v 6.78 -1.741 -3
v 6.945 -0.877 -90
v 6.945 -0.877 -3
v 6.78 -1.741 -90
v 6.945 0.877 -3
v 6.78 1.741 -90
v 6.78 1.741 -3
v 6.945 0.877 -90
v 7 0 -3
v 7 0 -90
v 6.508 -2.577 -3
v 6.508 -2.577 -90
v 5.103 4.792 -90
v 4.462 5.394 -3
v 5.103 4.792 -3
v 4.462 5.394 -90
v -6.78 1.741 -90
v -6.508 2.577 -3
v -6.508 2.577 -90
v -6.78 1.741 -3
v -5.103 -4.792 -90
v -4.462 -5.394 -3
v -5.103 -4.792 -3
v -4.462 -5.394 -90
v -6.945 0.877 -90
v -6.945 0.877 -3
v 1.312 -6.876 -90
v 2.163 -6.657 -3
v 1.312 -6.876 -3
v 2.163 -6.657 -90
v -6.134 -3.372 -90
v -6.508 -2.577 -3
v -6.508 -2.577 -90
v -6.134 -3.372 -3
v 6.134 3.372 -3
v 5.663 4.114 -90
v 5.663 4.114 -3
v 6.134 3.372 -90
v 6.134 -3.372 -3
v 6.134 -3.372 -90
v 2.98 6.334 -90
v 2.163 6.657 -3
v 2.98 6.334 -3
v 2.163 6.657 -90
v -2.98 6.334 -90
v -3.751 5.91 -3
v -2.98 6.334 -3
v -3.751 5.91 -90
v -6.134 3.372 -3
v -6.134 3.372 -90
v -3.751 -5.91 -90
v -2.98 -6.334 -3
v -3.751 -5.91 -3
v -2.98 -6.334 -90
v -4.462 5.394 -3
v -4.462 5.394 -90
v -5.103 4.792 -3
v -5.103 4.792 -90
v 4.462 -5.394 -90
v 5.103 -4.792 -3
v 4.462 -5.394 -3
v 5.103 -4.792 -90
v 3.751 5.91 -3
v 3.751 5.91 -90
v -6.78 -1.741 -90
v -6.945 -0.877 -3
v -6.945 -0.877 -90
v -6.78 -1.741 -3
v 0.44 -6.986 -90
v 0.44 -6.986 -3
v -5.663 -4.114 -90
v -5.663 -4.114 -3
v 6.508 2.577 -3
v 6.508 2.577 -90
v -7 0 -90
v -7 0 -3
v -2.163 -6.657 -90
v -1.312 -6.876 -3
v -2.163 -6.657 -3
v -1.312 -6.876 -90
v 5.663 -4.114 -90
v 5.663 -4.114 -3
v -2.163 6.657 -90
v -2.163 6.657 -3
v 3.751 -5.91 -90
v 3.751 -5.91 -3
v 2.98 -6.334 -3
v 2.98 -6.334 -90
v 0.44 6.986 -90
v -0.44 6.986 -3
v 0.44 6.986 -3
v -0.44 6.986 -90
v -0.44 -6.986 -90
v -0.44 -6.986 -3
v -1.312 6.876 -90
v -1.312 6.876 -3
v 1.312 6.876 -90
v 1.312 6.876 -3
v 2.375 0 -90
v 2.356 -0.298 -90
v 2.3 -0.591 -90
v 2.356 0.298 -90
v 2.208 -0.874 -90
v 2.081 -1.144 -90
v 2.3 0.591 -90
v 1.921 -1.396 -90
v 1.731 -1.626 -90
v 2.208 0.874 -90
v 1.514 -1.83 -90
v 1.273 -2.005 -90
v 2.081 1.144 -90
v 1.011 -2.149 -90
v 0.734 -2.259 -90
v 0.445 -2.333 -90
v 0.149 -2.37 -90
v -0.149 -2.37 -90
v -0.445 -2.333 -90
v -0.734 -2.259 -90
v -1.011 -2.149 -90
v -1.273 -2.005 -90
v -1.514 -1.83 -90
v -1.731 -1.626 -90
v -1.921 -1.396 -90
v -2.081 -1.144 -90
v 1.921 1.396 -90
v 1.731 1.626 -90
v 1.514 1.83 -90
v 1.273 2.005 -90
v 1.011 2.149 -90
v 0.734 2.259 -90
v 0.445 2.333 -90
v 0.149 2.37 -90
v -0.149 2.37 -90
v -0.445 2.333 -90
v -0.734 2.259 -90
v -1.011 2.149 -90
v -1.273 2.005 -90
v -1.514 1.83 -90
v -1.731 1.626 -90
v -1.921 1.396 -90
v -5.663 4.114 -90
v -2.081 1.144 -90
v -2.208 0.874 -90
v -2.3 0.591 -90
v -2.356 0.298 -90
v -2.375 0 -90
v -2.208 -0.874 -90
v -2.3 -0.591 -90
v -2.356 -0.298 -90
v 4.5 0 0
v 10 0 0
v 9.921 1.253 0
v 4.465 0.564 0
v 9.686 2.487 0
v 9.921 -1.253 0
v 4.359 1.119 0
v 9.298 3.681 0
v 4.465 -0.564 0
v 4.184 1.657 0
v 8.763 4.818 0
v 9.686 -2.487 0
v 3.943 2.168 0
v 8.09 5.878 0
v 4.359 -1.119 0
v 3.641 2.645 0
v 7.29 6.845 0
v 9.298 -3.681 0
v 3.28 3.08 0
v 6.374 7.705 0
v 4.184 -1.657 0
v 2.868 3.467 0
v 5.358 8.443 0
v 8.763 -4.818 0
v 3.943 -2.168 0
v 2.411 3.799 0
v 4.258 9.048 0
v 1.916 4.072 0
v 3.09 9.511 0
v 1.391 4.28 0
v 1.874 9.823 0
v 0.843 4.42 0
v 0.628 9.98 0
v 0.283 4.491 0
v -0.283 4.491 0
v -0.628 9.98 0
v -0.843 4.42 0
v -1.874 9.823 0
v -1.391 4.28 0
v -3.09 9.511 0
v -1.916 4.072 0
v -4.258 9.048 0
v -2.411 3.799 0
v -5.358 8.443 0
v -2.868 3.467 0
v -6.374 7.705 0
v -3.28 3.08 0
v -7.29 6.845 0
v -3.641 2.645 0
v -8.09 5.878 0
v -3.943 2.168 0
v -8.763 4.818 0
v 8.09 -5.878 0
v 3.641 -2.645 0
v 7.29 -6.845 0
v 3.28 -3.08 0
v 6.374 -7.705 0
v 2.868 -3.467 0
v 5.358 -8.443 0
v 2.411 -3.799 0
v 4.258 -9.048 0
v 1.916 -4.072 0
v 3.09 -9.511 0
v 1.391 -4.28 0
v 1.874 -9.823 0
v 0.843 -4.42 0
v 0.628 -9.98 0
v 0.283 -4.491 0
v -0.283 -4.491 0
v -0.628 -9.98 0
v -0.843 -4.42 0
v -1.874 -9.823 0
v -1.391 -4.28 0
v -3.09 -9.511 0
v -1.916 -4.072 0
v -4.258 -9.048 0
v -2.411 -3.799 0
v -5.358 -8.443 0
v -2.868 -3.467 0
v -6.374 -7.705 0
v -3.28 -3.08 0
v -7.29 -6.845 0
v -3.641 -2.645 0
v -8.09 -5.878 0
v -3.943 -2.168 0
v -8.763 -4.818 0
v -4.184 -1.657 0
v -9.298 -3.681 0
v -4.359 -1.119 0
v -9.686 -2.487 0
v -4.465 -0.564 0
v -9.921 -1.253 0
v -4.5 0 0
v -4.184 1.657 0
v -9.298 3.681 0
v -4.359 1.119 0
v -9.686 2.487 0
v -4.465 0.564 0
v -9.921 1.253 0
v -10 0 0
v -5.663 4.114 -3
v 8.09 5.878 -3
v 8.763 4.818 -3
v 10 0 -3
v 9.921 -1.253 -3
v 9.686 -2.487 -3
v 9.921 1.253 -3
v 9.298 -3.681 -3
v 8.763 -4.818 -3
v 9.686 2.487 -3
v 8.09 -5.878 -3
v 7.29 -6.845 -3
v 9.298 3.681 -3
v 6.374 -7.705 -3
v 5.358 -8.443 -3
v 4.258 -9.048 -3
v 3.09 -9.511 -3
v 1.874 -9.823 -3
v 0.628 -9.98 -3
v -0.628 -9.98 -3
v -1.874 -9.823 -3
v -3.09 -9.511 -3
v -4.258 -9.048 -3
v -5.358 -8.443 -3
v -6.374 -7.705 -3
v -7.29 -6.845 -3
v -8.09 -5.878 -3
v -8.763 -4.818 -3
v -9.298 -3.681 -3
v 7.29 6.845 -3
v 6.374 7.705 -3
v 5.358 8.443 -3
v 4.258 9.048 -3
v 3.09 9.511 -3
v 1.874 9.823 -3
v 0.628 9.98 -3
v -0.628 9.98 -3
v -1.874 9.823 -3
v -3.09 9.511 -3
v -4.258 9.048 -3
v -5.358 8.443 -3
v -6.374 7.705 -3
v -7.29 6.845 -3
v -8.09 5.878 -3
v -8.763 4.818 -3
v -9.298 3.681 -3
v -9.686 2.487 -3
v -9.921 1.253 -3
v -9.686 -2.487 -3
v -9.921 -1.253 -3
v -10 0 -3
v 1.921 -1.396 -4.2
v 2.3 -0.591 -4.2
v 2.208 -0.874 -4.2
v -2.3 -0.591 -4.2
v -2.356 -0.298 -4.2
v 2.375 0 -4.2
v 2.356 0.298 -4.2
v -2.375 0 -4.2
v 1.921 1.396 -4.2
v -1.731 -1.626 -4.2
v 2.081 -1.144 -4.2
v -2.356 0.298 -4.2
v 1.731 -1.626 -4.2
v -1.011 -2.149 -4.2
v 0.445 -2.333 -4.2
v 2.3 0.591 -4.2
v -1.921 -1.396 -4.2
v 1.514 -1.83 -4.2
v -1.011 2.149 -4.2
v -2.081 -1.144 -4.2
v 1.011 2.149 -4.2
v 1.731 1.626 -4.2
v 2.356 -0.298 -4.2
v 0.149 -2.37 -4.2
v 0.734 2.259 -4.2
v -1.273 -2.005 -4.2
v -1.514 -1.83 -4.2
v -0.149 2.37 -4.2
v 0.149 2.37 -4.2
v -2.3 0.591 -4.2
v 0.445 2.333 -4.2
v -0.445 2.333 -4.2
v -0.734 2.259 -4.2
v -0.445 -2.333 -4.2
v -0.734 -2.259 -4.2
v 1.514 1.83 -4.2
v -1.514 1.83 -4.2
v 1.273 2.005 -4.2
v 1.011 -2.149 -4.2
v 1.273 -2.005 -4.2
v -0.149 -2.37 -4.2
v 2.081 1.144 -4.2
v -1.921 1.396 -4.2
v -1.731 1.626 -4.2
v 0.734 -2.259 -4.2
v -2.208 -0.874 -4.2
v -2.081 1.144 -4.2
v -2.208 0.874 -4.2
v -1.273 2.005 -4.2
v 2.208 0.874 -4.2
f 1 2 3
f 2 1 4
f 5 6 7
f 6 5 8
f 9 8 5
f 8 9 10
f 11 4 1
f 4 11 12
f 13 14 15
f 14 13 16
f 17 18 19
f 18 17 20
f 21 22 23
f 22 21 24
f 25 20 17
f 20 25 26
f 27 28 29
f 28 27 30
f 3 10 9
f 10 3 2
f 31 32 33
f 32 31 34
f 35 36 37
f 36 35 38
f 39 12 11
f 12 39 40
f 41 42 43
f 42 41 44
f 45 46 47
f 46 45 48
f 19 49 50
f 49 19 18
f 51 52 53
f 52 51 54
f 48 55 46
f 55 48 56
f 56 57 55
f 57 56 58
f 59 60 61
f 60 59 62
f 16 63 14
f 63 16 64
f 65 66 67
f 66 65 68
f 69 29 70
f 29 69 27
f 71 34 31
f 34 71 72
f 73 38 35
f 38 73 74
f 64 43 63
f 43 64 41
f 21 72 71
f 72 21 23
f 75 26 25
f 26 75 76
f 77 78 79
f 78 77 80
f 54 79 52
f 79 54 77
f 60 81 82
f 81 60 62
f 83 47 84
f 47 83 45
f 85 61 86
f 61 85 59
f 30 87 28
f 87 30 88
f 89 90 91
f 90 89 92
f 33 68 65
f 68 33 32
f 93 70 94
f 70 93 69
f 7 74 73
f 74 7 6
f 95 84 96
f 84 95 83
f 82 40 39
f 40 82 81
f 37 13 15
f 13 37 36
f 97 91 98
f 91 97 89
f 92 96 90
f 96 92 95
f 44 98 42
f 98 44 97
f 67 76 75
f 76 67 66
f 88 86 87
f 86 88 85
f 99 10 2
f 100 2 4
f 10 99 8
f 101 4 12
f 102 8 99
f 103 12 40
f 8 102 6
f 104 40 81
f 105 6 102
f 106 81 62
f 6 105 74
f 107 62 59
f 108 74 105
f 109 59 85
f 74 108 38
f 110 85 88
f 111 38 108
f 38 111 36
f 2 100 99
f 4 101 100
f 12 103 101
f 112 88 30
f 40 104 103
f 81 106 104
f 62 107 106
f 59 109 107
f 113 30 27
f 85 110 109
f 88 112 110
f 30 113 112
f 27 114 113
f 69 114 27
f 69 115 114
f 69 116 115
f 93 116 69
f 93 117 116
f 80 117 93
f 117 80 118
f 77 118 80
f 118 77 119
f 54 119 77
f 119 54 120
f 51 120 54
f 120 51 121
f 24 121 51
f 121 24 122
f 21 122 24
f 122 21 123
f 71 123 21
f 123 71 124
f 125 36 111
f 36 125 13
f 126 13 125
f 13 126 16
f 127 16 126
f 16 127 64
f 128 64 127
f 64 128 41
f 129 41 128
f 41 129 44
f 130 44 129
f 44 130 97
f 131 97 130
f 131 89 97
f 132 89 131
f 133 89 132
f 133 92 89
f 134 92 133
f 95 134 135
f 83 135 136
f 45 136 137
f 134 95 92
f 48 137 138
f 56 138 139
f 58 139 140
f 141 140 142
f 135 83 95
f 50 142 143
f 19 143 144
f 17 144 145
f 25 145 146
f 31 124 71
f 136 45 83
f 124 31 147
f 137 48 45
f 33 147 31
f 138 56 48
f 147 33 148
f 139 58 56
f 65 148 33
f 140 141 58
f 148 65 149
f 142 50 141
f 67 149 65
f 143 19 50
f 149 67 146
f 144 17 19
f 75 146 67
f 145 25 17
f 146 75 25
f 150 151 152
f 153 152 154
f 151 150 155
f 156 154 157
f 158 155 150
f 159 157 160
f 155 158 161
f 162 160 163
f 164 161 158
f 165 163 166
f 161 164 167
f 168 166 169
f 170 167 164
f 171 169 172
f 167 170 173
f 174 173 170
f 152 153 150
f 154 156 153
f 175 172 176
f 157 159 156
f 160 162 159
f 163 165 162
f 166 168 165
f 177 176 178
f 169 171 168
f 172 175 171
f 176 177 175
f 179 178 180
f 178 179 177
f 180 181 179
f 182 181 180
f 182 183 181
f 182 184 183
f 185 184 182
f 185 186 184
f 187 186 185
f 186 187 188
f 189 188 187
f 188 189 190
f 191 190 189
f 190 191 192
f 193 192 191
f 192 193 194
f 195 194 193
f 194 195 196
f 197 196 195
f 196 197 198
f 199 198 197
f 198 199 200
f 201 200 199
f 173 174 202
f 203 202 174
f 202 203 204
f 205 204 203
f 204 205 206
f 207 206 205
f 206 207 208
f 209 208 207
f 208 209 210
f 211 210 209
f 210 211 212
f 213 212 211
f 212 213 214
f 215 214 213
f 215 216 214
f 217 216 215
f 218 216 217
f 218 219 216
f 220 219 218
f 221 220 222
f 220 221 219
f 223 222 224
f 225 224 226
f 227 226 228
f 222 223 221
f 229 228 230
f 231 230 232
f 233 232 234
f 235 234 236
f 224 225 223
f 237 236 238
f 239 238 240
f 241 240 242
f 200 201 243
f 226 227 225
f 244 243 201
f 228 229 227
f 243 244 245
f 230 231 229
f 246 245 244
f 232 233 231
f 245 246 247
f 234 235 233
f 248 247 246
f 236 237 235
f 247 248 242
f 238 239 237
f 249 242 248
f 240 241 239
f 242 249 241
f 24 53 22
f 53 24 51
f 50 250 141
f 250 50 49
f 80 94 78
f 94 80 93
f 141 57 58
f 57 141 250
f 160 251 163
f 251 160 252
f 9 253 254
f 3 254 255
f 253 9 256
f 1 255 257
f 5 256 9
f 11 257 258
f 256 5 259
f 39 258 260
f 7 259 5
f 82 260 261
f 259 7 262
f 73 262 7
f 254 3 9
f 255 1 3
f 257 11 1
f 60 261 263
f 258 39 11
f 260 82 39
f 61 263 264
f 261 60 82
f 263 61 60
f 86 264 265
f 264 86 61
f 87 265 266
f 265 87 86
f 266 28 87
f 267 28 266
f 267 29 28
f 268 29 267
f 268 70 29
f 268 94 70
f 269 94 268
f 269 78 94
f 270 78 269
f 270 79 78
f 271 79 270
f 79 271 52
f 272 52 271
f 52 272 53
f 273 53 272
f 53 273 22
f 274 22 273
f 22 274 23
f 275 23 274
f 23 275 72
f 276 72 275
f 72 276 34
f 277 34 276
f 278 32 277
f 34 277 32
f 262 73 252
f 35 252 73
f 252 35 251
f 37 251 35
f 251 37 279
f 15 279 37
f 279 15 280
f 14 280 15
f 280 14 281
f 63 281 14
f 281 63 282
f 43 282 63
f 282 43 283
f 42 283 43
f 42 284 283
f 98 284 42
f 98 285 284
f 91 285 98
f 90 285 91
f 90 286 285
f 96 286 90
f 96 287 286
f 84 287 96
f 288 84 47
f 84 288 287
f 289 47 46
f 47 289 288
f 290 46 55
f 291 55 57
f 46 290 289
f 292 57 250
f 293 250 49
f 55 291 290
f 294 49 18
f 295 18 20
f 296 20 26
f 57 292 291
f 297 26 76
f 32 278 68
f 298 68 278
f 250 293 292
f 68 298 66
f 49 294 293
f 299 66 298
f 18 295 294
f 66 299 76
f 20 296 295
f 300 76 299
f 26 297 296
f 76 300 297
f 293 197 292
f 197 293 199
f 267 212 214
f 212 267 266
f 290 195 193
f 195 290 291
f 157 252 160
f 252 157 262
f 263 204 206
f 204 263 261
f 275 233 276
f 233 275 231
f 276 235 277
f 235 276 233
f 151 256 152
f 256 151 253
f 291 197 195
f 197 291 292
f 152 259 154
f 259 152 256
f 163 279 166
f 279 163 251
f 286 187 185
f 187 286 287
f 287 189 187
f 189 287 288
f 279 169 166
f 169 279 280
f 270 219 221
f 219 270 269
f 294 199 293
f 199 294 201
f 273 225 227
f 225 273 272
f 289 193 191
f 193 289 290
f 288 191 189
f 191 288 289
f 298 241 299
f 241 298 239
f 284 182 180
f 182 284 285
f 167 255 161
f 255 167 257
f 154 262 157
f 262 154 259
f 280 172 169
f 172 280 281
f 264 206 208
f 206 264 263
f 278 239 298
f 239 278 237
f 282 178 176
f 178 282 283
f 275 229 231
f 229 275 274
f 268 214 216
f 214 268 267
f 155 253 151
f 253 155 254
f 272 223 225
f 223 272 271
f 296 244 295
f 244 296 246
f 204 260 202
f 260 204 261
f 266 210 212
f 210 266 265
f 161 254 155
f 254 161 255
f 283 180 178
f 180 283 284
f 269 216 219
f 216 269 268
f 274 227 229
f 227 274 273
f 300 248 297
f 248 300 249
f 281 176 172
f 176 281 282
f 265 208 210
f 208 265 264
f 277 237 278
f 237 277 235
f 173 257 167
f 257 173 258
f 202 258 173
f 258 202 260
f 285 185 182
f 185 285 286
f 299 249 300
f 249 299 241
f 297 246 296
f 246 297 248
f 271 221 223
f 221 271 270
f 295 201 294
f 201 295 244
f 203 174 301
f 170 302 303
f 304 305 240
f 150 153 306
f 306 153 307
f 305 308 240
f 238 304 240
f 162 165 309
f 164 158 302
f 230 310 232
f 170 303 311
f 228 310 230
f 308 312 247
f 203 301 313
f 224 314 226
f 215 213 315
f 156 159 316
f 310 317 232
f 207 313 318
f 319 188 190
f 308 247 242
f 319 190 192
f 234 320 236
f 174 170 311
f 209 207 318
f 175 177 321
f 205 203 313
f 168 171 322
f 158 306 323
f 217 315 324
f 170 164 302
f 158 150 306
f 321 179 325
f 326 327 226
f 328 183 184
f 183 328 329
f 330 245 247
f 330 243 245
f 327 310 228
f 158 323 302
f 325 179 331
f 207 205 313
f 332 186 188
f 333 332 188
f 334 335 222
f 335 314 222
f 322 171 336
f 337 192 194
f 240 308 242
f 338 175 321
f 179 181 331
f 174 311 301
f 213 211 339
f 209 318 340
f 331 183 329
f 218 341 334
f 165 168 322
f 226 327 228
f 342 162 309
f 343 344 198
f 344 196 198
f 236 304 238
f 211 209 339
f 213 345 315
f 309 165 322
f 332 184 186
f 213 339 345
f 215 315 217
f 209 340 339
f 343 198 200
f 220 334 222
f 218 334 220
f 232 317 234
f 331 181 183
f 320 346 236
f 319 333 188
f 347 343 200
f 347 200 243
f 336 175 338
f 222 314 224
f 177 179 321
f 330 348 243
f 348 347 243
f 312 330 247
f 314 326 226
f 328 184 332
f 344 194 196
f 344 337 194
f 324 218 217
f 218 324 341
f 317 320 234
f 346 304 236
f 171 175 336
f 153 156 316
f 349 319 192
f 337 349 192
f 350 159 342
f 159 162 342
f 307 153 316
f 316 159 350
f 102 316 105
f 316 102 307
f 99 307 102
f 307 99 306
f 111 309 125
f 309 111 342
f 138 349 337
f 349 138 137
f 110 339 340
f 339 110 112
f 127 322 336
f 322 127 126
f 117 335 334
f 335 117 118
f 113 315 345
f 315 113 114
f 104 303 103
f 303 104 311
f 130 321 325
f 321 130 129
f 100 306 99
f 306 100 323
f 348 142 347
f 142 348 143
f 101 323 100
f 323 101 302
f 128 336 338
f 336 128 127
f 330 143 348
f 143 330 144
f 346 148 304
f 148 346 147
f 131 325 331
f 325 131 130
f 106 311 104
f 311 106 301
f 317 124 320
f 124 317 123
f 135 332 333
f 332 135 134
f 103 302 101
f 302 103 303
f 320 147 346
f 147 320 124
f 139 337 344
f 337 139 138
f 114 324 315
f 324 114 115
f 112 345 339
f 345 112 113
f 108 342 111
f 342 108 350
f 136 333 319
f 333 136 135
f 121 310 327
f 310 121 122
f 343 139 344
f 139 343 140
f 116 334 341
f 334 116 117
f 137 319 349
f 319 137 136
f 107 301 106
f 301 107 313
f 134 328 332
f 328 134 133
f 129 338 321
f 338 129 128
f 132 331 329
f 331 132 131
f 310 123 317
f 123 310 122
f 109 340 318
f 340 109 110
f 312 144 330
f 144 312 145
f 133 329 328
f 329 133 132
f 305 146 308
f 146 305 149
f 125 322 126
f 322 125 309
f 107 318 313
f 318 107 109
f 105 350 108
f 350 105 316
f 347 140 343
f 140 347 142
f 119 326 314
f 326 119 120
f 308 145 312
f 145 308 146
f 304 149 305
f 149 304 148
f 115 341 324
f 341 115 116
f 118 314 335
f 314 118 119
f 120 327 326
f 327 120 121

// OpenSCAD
$fn = 50;


difference() {
	union() {
		translate(v = [0, 0, -90.0000000000]) {
			cylinder(h = 90, r = 7.0000000000);
		}
		translate(v = [0, 0, -3.0000000000]) {
			cylinder(h = 3, r = 10.0000000000);
		}
	}
	union() {
		translate(v = [0, 0, 0]) {
			rotate(a = [0, 0, 0]) {
				difference() {
					union() {
						#translate(v = [0, 0, -90.0000000000]) {
							cylinder(h = 90, r = 2.2500000000);
						}
						#translate(v = [0, 0, -4.2000000000]) {
							cylinder(h = 4.2000000000, r = 7.0000000000, r1 = 2.3750000000, r2 = 4.5000000000);
						}
						#translate(v = [0, 0, -90.0000000000]) {
							cylinder(h = 90, r = 2.3750000000);
						}
						#translate(v = [0, 0, -90.0000000000]) {
							cylinder(h = 90, r = 2.2500000000);
						}
					}
					union();
				}
			}
		}
	}
}
